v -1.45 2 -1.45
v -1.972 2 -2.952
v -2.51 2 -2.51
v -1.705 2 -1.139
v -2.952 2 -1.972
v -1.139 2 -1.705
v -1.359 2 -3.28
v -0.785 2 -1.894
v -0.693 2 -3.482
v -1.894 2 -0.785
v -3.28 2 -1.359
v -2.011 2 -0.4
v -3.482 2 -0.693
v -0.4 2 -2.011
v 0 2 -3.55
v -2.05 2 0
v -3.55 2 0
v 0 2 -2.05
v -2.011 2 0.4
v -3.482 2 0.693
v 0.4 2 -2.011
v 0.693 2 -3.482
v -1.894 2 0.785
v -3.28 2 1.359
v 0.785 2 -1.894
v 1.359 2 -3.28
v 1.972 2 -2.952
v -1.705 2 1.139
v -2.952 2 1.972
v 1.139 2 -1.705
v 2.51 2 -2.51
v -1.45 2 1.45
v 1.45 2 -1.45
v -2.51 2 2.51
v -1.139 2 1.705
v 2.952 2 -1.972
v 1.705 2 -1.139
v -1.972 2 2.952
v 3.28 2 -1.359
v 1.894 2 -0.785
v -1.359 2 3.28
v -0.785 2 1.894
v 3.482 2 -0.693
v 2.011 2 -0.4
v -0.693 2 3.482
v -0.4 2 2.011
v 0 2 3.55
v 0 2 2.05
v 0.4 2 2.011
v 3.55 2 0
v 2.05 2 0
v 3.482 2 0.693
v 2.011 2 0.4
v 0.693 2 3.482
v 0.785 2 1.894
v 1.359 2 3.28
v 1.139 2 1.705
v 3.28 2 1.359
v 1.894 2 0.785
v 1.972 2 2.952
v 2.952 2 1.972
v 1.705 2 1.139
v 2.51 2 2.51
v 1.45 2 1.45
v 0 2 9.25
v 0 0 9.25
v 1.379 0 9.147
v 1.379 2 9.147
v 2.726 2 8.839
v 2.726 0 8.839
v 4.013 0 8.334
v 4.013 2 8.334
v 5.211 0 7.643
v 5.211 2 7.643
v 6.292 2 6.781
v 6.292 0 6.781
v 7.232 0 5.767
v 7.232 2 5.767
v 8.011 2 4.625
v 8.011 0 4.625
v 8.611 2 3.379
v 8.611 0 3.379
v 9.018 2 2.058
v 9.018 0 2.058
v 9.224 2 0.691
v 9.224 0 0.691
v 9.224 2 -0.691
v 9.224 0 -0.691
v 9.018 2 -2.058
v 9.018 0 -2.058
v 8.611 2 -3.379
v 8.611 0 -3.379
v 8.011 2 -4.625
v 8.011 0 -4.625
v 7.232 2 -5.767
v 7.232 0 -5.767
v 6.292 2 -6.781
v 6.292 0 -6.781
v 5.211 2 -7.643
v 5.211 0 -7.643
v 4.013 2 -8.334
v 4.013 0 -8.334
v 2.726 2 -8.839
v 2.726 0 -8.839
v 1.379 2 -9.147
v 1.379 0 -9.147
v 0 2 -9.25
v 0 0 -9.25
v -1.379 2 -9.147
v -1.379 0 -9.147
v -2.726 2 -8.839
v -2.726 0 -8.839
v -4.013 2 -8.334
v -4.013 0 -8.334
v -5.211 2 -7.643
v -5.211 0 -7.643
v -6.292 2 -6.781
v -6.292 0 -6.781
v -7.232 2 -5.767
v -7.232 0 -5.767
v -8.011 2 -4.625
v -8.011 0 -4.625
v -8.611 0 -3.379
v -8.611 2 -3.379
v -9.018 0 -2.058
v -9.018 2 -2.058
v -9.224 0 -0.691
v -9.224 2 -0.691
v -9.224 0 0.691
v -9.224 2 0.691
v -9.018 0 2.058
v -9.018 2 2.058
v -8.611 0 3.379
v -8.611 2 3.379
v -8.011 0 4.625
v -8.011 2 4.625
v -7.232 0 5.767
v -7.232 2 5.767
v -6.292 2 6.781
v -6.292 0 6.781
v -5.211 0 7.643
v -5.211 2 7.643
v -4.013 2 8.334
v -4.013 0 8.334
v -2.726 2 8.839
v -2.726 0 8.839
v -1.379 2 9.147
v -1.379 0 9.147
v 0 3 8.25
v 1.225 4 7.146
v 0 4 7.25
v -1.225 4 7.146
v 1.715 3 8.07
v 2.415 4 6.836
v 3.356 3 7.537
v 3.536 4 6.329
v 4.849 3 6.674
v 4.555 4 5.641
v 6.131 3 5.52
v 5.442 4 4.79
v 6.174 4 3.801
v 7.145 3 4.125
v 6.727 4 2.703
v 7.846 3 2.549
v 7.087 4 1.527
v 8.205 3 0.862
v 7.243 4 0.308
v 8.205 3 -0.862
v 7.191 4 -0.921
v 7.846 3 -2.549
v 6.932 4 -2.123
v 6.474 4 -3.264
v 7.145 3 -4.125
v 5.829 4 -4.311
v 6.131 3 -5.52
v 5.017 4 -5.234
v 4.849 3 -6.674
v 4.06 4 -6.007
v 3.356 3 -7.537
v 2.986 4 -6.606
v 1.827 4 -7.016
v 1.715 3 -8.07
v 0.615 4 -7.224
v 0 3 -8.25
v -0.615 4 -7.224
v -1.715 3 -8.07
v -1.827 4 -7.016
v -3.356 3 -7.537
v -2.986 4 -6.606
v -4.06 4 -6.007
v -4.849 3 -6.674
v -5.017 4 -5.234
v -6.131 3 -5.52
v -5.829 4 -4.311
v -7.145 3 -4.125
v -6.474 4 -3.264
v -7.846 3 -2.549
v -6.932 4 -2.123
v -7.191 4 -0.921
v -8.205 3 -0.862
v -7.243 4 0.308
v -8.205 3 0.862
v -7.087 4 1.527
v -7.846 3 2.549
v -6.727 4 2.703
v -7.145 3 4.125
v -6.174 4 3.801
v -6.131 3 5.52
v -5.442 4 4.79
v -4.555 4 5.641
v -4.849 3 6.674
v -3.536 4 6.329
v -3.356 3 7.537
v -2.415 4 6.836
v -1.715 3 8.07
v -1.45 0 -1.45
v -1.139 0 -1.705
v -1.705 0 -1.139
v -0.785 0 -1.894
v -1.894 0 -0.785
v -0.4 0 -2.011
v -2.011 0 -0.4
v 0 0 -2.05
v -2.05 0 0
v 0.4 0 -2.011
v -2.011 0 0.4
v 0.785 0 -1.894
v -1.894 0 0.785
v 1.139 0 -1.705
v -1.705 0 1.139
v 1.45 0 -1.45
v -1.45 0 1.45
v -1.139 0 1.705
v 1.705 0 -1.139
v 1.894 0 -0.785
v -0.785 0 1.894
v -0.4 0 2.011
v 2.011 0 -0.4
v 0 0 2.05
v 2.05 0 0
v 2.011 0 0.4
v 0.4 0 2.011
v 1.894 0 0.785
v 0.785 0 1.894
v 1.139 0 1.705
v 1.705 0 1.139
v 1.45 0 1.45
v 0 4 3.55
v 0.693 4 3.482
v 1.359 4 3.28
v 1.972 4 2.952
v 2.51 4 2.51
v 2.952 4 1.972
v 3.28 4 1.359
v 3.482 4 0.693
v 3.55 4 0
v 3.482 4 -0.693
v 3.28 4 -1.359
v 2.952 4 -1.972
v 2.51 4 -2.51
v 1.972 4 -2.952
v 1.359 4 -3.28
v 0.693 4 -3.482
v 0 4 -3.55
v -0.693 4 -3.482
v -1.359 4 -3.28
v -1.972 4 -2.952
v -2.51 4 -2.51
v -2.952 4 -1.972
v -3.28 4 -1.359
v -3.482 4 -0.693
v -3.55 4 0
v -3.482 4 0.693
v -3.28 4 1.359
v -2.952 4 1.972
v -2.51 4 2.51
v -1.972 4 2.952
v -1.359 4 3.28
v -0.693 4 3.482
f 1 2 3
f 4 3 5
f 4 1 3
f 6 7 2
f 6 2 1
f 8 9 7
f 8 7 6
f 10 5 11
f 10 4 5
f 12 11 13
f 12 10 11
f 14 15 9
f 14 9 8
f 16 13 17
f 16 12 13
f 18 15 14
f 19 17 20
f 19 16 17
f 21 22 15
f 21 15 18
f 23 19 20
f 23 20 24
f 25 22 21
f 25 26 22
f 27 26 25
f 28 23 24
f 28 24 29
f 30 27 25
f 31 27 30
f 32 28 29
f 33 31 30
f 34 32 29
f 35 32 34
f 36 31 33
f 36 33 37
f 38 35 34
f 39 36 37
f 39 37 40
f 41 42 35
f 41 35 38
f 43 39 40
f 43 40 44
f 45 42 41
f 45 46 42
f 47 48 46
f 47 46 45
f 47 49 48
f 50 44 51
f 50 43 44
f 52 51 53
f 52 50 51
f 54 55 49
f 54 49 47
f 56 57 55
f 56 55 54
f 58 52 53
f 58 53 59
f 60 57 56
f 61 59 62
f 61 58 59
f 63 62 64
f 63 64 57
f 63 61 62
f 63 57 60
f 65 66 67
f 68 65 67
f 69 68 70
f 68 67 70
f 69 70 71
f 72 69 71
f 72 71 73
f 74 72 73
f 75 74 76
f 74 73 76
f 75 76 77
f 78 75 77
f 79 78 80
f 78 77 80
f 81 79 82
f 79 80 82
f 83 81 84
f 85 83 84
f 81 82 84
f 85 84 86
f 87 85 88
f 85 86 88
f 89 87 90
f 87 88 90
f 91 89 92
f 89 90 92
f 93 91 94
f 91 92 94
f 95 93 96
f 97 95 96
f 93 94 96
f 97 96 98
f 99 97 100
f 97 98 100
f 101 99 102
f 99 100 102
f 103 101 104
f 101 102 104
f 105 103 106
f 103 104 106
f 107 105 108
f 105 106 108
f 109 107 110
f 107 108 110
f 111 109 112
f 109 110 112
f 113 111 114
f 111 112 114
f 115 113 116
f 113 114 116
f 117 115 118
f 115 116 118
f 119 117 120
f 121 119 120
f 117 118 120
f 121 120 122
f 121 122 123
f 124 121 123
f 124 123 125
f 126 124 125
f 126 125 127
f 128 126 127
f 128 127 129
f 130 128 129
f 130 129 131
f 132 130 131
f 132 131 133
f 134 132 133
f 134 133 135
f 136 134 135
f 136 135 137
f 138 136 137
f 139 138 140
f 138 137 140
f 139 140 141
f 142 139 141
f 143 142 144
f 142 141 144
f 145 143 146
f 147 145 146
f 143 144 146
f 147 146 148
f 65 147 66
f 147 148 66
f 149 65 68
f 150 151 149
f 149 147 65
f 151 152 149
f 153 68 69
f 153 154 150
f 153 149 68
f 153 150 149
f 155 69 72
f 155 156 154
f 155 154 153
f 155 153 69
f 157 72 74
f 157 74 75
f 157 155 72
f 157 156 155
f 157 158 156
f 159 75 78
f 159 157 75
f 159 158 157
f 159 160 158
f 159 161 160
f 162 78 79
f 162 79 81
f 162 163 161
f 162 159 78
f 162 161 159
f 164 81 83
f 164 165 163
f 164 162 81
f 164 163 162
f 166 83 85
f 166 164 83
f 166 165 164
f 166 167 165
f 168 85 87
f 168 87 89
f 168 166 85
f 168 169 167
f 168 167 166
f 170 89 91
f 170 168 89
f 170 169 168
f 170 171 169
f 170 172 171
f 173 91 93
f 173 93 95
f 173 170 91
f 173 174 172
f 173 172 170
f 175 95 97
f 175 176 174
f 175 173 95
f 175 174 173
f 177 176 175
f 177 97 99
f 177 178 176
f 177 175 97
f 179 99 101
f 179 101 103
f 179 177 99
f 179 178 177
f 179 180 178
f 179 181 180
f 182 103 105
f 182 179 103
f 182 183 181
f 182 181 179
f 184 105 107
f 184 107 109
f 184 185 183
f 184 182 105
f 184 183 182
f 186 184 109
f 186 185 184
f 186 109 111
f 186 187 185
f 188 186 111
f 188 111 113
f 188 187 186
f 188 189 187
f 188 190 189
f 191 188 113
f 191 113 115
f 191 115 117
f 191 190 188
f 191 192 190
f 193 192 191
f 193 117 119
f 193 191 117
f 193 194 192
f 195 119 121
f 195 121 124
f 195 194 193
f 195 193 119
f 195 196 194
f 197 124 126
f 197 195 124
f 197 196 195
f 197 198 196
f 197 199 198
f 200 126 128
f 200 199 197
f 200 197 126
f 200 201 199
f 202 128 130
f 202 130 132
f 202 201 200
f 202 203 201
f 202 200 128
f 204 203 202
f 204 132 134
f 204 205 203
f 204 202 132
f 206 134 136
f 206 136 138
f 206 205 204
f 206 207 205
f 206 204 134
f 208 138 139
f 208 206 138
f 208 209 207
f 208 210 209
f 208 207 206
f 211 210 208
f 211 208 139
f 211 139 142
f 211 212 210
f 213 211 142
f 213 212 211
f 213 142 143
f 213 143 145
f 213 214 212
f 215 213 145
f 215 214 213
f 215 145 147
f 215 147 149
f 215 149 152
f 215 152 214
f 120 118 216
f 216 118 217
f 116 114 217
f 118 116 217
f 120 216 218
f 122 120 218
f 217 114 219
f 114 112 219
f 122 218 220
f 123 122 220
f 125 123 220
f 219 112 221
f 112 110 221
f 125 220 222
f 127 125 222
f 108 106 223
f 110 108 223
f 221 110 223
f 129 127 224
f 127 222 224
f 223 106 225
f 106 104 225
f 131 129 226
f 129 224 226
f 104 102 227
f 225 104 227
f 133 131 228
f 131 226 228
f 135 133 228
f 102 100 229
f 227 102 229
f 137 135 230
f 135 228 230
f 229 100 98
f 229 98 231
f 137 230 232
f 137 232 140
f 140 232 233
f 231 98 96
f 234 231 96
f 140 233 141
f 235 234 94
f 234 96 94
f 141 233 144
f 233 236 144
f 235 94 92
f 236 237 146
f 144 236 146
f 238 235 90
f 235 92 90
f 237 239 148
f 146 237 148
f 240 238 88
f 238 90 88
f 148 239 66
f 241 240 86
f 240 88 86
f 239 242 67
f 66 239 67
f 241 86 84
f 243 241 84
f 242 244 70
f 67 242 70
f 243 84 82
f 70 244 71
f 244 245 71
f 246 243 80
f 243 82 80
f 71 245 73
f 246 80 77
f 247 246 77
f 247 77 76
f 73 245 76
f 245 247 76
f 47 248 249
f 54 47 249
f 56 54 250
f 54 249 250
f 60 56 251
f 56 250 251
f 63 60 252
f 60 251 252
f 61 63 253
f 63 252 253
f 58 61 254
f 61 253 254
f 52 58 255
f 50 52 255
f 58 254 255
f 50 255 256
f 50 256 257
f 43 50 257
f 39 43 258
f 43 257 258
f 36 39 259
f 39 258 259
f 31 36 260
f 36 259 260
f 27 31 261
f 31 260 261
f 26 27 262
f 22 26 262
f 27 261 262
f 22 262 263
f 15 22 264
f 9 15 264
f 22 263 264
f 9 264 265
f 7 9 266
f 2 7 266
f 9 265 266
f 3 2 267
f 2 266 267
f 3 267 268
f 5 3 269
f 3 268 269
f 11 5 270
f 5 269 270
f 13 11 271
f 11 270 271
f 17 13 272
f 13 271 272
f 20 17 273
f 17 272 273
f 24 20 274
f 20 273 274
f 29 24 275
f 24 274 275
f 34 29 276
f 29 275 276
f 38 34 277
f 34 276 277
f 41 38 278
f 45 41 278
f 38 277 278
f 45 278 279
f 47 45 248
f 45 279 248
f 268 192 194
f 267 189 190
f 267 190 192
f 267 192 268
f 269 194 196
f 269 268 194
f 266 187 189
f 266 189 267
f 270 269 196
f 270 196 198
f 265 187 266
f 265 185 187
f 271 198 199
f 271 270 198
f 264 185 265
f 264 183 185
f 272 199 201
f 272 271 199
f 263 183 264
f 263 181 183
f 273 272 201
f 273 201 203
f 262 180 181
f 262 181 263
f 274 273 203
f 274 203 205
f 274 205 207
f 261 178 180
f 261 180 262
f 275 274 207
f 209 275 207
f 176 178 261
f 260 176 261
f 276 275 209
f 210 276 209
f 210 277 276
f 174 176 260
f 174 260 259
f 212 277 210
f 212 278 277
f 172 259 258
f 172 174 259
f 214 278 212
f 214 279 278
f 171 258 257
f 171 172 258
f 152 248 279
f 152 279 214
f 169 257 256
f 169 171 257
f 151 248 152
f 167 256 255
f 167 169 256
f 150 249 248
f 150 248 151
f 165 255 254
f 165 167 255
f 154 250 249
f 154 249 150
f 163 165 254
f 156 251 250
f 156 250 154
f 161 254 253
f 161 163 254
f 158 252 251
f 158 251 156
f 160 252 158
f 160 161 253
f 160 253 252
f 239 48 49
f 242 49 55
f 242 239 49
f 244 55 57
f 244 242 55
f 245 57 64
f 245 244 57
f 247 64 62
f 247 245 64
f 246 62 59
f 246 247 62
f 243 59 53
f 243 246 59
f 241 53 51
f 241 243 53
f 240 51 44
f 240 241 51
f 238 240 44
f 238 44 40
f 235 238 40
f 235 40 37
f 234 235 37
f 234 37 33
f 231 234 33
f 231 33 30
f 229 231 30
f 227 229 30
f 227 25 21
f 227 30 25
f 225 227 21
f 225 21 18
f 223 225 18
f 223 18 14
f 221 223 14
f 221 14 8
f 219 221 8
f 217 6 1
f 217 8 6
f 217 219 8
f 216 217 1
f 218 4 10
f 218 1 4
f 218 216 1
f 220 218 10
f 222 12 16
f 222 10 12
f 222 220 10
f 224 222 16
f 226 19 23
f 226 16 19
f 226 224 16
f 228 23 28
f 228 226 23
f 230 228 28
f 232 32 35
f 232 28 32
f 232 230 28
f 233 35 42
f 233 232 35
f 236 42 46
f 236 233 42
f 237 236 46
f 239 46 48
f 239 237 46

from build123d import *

# Parameters (mm, degrees)
SKETCH1_R           = 9.25
SKETCH1_R_2         = 2.05
BOSS_EXTRUDE1_DEPTH = 4
SKETCH2_R           = 3.55
CUT_EXTRUDE1_DEPTH  = 2
CHAMFER1_SIZE       = 2


with BuildPart() as part:
    # Sketch1 → Boss-Extrude1 (new body)
    with BuildSketch(Plane(origin=(0, 0, 0), x_dir=(1, 0, 0), z_dir=(0, 1, 0))):
        with Locations(Location((0, 0, 0), (0, 0, 270))):
            Circle(SKETCH1_R)
        with Locations(Location((0, 0, 0), (0, 0, 270))):
            Circle(SKETCH1_R_2, mode=Mode.SUBTRACT)
    extrude(amount=BOSS_EXTRUDE1_DEPTH)

    # Sketch2 → Cut-Extrude1 (cut)
    with BuildSketch(Plane(origin=(0, 4, 0), x_dir=(1, 0, 0), z_dir=(0, 1, 0))):
        with Locations(Location((0, 0, 0), (0, 0, 270))):
            Circle(SKETCH2_R)
    extrude(amount=-CUT_EXTRUDE1_DEPTH, mode=Mode.SUBTRACT)

    # Chamfer1
    chamfer1_edges = [part.edges().sort_by_distance(p)[0] for p in [
        (0, 4, -9.25),
    ]]
    chamfer(chamfer1_edges, length=CHAMFER1_SIZE)


solid = part.part
